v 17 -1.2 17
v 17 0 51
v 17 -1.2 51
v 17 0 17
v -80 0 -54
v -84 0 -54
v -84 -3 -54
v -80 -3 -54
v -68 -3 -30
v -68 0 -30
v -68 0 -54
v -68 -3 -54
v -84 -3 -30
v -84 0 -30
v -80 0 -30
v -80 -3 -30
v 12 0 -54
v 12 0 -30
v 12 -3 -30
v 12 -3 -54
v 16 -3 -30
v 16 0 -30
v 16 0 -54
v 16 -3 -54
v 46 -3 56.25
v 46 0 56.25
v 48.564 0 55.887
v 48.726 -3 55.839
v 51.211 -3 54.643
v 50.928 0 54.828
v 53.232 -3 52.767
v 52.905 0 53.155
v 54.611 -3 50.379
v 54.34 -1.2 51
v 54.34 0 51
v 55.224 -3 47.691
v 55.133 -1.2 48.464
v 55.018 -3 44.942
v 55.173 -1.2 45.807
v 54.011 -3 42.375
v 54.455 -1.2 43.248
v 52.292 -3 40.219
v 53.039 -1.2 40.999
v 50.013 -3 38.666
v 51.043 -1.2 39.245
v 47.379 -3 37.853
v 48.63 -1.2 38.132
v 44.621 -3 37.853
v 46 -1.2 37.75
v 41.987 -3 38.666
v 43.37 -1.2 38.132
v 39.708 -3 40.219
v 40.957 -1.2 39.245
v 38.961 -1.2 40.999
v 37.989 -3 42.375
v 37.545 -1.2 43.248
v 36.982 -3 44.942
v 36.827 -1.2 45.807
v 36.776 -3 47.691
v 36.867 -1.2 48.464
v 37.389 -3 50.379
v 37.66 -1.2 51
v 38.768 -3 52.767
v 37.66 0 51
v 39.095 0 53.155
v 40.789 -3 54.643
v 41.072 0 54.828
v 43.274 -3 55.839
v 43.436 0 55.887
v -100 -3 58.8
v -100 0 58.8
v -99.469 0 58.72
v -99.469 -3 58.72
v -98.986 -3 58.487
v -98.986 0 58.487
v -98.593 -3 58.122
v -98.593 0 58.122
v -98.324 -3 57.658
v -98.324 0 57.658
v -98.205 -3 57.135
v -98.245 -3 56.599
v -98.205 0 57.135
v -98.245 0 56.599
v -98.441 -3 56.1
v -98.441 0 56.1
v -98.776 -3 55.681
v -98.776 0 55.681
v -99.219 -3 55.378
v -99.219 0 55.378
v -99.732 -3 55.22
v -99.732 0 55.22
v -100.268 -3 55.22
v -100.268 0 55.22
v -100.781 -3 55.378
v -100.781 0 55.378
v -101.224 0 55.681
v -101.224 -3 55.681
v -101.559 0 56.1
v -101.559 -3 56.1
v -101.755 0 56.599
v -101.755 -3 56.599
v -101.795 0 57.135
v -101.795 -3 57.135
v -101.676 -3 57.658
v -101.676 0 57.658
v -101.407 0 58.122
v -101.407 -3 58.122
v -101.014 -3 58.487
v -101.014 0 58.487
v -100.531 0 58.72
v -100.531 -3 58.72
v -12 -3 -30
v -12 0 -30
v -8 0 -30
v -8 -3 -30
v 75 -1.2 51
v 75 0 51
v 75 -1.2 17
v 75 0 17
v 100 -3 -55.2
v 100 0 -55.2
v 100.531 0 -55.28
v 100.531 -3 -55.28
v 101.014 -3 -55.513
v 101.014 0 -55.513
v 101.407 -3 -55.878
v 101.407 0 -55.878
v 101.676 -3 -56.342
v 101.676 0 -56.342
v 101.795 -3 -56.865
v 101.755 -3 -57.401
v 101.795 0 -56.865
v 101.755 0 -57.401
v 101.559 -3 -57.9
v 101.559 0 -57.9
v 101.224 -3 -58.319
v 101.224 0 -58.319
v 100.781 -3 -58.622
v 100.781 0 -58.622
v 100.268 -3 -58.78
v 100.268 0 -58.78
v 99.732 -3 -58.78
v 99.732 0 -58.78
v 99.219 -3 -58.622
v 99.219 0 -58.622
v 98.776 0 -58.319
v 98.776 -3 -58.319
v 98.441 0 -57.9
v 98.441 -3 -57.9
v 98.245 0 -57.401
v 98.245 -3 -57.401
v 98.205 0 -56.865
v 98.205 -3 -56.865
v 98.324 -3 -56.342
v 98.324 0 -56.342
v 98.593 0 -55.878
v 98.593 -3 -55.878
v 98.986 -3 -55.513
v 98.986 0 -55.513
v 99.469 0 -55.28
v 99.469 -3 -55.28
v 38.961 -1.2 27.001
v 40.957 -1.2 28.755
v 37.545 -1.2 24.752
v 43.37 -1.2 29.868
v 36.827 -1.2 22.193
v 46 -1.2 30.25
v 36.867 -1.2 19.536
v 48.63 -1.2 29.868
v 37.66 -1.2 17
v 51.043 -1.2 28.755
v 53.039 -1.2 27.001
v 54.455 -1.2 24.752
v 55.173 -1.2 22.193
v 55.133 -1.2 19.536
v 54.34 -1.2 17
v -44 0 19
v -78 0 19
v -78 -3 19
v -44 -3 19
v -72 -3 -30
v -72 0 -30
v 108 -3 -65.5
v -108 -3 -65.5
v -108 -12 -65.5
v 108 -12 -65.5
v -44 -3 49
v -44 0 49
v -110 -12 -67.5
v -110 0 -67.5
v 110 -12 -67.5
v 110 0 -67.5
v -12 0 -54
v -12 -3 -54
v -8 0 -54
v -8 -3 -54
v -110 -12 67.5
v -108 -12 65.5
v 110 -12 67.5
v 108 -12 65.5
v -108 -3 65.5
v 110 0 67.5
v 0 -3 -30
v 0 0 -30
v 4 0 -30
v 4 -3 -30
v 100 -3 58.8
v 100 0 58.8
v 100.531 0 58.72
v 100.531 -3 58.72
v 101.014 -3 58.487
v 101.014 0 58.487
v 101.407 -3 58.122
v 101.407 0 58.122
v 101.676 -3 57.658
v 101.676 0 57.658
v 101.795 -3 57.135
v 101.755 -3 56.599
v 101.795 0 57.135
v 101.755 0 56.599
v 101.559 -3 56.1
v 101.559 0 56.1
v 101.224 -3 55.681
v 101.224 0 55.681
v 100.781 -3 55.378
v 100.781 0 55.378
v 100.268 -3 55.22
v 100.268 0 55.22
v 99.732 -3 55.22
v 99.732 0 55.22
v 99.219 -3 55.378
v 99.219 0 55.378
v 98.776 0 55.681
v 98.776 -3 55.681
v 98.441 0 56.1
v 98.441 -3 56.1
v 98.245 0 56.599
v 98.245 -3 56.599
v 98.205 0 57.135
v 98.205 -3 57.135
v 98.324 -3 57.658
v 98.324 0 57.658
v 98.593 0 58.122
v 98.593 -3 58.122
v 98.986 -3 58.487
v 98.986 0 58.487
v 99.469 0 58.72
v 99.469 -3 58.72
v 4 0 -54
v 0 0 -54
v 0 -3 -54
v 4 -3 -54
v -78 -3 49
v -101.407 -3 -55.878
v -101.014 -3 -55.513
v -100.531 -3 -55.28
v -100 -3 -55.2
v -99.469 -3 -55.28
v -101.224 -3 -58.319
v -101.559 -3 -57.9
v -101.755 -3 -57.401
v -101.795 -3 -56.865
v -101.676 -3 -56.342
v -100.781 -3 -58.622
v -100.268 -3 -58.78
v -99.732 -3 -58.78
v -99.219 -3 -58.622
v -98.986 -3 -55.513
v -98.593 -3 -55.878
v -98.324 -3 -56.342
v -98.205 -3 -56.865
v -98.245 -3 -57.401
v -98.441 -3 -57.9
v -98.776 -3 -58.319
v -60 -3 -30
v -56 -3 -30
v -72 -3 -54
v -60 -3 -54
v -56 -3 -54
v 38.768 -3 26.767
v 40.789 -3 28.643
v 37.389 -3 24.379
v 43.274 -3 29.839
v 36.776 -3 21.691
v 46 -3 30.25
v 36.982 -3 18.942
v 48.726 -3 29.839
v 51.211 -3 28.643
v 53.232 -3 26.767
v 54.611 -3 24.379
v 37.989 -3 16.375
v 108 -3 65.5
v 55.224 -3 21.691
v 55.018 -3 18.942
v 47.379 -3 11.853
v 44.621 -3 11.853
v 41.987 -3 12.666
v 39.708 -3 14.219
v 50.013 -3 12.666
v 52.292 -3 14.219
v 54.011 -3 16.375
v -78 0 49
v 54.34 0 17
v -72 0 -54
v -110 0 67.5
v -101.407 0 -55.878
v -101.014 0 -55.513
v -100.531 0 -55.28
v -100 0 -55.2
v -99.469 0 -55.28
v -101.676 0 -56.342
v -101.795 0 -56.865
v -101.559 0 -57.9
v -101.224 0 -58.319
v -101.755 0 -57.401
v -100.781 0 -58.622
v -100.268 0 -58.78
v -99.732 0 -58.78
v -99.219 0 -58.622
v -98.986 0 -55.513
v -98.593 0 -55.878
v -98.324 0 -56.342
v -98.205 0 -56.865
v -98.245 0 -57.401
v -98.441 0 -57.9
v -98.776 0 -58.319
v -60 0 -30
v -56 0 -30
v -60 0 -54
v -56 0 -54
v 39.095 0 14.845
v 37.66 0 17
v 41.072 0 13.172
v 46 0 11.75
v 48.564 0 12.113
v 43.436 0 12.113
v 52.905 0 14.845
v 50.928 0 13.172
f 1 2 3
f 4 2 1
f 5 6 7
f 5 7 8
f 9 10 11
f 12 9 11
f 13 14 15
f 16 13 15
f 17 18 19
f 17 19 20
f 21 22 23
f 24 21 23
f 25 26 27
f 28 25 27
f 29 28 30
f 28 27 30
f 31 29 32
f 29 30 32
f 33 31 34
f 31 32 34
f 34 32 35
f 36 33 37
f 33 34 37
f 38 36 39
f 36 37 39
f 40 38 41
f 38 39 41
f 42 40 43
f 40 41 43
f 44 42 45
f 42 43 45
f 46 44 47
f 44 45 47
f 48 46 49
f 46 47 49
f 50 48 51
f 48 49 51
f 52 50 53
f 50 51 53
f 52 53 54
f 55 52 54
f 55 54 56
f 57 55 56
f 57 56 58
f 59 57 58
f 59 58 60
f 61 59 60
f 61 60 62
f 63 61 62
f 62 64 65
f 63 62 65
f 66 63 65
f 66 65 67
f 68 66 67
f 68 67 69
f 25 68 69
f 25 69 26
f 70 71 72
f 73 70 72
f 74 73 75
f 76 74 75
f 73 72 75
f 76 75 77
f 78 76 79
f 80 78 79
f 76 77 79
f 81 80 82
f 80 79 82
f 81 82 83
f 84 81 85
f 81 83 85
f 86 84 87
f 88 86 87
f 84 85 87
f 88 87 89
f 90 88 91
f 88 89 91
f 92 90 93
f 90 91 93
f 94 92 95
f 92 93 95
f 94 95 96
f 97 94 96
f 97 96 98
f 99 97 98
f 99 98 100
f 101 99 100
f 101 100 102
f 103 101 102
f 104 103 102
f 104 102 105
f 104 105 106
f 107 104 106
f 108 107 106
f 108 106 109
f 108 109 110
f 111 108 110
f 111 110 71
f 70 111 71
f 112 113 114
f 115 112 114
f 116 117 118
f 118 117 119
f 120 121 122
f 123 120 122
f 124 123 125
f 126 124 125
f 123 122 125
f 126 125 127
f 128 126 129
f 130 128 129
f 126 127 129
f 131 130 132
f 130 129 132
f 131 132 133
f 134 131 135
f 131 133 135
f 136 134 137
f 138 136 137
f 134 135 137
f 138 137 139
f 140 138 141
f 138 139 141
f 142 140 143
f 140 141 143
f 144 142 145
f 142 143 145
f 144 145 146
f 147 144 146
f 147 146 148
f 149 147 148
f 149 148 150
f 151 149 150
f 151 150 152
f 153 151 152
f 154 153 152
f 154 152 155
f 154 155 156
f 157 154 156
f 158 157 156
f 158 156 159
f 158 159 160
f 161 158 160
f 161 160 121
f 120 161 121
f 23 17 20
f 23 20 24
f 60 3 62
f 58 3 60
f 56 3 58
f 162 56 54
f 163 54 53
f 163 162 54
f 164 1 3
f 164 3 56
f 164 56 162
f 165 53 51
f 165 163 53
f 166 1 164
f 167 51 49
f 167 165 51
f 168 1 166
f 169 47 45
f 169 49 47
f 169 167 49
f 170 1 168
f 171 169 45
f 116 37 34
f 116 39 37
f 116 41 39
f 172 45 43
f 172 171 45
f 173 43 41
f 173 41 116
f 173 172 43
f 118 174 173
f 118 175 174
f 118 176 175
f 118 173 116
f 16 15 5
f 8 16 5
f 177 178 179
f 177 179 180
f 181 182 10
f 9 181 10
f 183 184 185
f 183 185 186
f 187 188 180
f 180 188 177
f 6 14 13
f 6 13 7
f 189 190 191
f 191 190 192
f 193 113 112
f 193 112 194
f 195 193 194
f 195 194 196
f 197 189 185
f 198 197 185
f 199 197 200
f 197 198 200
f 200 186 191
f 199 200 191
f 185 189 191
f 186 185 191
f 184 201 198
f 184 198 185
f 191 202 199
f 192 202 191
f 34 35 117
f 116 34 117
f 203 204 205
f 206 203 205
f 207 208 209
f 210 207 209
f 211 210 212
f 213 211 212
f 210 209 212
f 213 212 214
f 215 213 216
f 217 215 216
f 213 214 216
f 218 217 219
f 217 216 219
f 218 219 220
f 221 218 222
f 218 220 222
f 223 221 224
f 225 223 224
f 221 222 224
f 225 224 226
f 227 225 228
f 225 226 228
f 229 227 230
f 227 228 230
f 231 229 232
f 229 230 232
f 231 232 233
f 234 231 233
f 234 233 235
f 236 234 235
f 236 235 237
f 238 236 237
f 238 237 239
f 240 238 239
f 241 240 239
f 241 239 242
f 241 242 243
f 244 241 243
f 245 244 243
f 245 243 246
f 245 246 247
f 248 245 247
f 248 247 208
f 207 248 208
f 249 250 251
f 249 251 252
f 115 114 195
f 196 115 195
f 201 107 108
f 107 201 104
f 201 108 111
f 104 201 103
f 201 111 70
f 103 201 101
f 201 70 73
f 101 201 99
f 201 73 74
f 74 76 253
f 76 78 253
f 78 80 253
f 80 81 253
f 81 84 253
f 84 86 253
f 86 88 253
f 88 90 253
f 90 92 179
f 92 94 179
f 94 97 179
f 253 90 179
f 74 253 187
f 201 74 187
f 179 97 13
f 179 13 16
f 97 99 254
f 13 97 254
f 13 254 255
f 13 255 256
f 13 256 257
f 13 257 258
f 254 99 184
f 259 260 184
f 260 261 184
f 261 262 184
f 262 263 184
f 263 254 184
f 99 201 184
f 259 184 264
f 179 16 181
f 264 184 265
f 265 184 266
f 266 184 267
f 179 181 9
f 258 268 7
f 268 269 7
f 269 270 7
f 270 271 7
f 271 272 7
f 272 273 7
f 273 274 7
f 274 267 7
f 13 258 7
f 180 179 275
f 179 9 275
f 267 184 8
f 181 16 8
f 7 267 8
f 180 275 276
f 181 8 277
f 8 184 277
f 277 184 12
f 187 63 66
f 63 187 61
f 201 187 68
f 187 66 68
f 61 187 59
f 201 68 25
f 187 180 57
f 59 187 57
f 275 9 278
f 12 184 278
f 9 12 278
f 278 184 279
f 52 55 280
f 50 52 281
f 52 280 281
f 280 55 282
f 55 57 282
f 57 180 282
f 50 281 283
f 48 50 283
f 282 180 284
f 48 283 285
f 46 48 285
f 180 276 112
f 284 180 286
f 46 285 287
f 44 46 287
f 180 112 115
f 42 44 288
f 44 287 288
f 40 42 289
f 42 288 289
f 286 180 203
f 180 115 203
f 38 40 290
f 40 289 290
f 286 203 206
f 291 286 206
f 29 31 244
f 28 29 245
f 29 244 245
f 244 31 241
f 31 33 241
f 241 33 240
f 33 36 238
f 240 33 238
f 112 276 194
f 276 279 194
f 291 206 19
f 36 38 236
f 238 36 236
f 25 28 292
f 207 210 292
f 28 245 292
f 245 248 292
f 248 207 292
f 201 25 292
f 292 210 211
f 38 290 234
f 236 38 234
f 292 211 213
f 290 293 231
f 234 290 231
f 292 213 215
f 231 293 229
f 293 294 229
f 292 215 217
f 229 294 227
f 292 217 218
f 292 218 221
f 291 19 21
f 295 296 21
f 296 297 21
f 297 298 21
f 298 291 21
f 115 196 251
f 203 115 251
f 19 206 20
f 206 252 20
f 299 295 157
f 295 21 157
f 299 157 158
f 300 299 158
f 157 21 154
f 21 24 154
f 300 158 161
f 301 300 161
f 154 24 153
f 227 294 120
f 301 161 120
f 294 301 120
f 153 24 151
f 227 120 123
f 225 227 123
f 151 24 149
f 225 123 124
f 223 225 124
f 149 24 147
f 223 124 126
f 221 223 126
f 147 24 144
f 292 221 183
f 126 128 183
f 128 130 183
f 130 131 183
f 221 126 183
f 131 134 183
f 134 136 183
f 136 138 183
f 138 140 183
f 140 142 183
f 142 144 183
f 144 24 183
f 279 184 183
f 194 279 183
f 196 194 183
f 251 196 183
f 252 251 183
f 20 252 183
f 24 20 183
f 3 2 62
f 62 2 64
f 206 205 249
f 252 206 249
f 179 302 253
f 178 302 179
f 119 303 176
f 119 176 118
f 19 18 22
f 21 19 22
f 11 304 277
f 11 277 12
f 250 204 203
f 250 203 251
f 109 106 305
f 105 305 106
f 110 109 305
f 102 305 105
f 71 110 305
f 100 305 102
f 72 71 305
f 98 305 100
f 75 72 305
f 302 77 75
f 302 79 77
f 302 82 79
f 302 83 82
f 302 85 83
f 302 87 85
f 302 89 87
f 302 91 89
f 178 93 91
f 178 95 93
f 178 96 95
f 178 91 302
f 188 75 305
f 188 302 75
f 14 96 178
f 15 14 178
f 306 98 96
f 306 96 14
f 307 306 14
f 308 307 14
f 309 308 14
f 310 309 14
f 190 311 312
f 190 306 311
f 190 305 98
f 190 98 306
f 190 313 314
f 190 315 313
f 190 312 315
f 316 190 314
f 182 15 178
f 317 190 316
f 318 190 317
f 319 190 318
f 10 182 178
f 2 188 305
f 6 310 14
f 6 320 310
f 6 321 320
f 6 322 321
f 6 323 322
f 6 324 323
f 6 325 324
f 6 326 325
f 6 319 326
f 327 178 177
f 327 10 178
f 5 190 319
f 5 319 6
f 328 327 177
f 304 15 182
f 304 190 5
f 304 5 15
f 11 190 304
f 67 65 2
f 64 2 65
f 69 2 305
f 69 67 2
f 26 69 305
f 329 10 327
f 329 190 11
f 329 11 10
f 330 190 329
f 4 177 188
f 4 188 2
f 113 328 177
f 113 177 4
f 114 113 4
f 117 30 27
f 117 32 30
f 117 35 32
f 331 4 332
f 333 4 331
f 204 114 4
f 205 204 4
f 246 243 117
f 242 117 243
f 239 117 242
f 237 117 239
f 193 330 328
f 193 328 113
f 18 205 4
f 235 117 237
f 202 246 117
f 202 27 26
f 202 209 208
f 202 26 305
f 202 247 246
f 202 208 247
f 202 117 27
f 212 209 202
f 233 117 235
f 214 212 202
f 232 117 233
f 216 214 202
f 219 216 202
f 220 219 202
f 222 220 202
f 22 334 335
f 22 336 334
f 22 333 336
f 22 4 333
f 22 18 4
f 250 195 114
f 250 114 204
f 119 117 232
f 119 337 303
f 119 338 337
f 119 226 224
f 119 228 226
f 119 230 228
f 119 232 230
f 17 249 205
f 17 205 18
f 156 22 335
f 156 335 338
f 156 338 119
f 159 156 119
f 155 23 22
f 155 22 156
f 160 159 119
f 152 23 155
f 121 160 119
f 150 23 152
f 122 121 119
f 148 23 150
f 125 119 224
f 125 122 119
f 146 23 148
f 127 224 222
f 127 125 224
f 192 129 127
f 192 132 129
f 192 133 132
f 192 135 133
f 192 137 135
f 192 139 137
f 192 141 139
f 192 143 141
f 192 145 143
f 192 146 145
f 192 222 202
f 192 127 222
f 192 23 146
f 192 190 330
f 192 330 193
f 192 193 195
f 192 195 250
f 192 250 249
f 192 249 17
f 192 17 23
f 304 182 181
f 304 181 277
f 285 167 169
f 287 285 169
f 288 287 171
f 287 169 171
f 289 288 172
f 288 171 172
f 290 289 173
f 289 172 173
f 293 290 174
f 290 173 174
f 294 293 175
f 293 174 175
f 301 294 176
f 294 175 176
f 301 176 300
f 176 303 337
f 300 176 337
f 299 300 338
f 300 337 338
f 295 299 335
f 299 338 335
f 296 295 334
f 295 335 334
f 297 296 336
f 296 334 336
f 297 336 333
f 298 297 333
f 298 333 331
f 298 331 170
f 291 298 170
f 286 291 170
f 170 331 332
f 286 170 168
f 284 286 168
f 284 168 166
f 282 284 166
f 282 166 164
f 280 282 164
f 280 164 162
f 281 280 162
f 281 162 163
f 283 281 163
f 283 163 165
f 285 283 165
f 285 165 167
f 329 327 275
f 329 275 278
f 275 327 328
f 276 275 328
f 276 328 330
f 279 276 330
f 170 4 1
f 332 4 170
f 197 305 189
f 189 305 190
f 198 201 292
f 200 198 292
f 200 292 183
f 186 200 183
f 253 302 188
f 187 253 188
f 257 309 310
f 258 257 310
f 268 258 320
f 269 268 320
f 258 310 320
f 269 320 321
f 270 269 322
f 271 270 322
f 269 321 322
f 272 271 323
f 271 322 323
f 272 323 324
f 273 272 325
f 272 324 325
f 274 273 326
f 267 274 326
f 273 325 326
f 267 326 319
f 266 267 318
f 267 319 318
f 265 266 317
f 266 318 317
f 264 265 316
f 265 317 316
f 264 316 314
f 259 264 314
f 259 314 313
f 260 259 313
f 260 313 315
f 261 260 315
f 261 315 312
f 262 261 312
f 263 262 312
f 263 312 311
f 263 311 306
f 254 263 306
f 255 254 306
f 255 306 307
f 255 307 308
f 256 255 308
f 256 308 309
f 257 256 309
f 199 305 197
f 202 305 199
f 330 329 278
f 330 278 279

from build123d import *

# Parameters (mm, degrees)
SKETCH_1_W                       = 220
SKETCH_1_H                       = 135
LID_TOP_3MM_DEPTH                = 3
SKETCH_2_W                       = 216
SKETCH_2_H                       = 2
LID_RIM_BACK_DEPTH               = 12
SKETCH_3_W                       = 216
SKETCH_3_H                       = 2
LID_RIM_FRONT_DEPTH              = 12
SKETCH_4_W                       = 2
SKETCH_4_H                       = 135
LID_RIM_LEFT_DEPTH               = 12
SKETCH_5_W                       = 2
SKETCH_5_H                       = 135
LID_RIM_RIGHT_DEPTH              = 12
SKETCH_6_R                       = 1.8
LID_SCREW_CLEARANCE_1_DEPTH      = 16
SKETCH_7_R                       = 1.8
LID_SCREW_CLEARANCE_2_DEPTH      = 16
SKETCH_8_R                       = 1.8
LID_SCREW_CLEARANCE_3_DEPTH      = 16
SKETCH_9_R                       = 1.8
LID_SCREW_CLEARANCE_4_DEPTH      = 16
SKETCH_10_R                      = 9
OV5647_LENS_OPENING_D18_DEPTH    = 4
SKETCH_11_W                      = 34
SKETCH_11_H                      = 30
OV5647_SERVICE_CLEARANCE_DEPTH   = 4
SKETCH_12_R                      = 9.25
HC_SR04_ACOUSTIC_OPENING_1_DEPTH = 4
SKETCH_13_R                      = 9.25
HC_SR04_ACOUSTIC_OPENING_2_DEPTH = 4
SKETCH_14_W                      = 58
SKETCH_14_H                      = 34
HC_SR04_RECESS_DEPTH             = 1.2
SKETCH_15_W                      = 4
SKETCH_15_H                      = 24
VENT_SLOT_1_DEPTH                = 4
SKETCH_16_W                      = 4
SKETCH_16_H                      = 24
VENT_SLOT_2_DEPTH                = 4
SKETCH_17_W                      = 4
SKETCH_17_H                      = 24
VENT_SLOT_3_DEPTH                = 4
SKETCH_18_W                      = 4
SKETCH_18_H                      = 24
VENT_SLOT_4_DEPTH                = 4
SKETCH_19_W                      = 4
SKETCH_19_H                      = 24
VENT_SLOT_5_DEPTH                = 4
SKETCH_20_W                      = 4
SKETCH_20_H                      = 24
VENT_SLOT_6_DEPTH                = 4


with BuildPart() as part:
    # 草图1 → Lid_Top_3mm (new body)
    with BuildSketch(Plane(origin=(0, 0, 0), x_dir=(1, 0, 0), z_dir=(0, 1, 0))):
        Rectangle(SKETCH_1_W, SKETCH_1_H)
    extrude(amount=-LID_TOP_3MM_DEPTH)

    # 草图2 → Lid_Rim_Back (add)
    with BuildSketch(Plane(origin=(0, 0, 0), x_dir=(1, 0, 0), z_dir=(0, 1, 0))):
        with Locations((0, 66.5)):
            Rectangle(SKETCH_2_W, SKETCH_2_H)
    extrude(amount=-LID_RIM_BACK_DEPTH)

    # 草图3 → Lid_Rim_Front (add)
    with BuildSketch(Plane(origin=(0, 0, 0), x_dir=(1, 0, 0), z_dir=(0, 1, 0))):
        with Locations((0, -66.5)):
            Rectangle(SKETCH_3_W, SKETCH_3_H)
    extrude(amount=-LID_RIM_FRONT_DEPTH)

    # 草图4 → Lid_Rim_Left (add)
    with BuildSketch(Plane(origin=(0, 0, 0), x_dir=(1, 0, 0), z_dir=(0, 1, 0))):
        with Locations((-109, 0)):
            Rectangle(SKETCH_4_W, SKETCH_4_H)
    extrude(amount=-LID_RIM_LEFT_DEPTH)

    # 草图5 → Lid_Rim_Right (add)
    with BuildSketch(Plane(origin=(0, 0, 0), x_dir=(1, 0, 0), z_dir=(0, 1, 0))):
        with Locations((109, 0)):
            Rectangle(SKETCH_5_W, SKETCH_5_H)
    extrude(amount=-LID_RIM_RIGHT_DEPTH)

    # 草图6 → Lid_Screw_Clearance_1 (cut)
    with BuildSketch(Plane(origin=(0, 0, 0), x_dir=(1, 0, 0), z_dir=(0, 1, 0))):
        with Locations(Location((-100, -57, 0), (0, 0, 270))):
            Circle(SKETCH_6_R)
    extrude(amount=-LID_SCREW_CLEARANCE_1_DEPTH, mode=Mode.SUBTRACT)

    # 草图7 → Lid_Screw_Clearance_2 (cut)
    with BuildSketch(Plane(origin=(0, 0, 0), x_dir=(1, 0, 0), z_dir=(0, 1, 0))):
        with Locations(Location((100, -57, 0), (0, 0, 270))):
            Circle(SKETCH_7_R)
    extrude(amount=-LID_SCREW_CLEARANCE_2_DEPTH, mode=Mode.SUBTRACT)

    # 草图8 → Lid_Screw_Clearance_3 (cut)
    with BuildSketch(Plane(origin=(0, 0, 0), x_dir=(1, 0, 0), z_dir=(0, 1, 0))):
        with Locations(Location((-100, 57, 0), (0, 0, 270))):
            Circle(SKETCH_8_R)
    extrude(amount=-LID_SCREW_CLEARANCE_3_DEPTH, mode=Mode.SUBTRACT)

    # 草图9 → Lid_Screw_Clearance_4 (cut)
    with BuildSketch(Plane(origin=(0, 0, 0), x_dir=(1, 0, 0), z_dir=(0, 1, 0))):
        with Locations(Location((100, 57, 0), (0, 0, 270))):
            Circle(SKETCH_9_R)
    extrude(amount=-LID_SCREW_CLEARANCE_4_DEPTH, mode=Mode.SUBTRACT)

    # 草图10 → OV5647_Lens_Opening_D18 (cut)
    with BuildSketch(Plane(origin=(0, 0, 0), x_dir=(1, 0, 0), z_dir=(0, 1, 0))):
        with Locations(Location((-61, -34, 0), (0, 0, 270))):
            Circle(SKETCH_10_R)
    extrude(amount=-OV5647_LENS_OPENING_D18_DEPTH, mode=Mode.SUBTRACT)

    # 草图11 → OV5647_Service_Clearance (cut)
    with BuildSketch(Plane(origin=(0, 0, 0), x_dir=(1, 0, 0), z_dir=(0, 1, 0))):
        with Locations((-61, -34)):
            Rectangle(SKETCH_11_W, SKETCH_11_H)
    extrude(amount=-OV5647_SERVICE_CLEARANCE_DEPTH, mode=Mode.SUBTRACT)

    # 草图12 → HC_SR04_Acoustic_Opening_1 (cut)
    with BuildSketch(Plane(origin=(0, 0, 0), x_dir=(1, 0, 0), z_dir=(0, 1, 0))):
        with Locations(Location((46, -47, 0), (0, 0, 270))):
            Circle(SKETCH_12_R)
    extrude(amount=-HC_SR04_ACOUSTIC_OPENING_1_DEPTH, mode=Mode.SUBTRACT)

    # 草图13 → HC_SR04_Acoustic_Opening_2 (cut)
    with BuildSketch(Plane(origin=(0, 0, 0), x_dir=(1, 0, 0), z_dir=(0, 1, 0))):
        with Locations(Location((46, -21, 0), (0, 0, 270))):
            Circle(SKETCH_13_R)
    extrude(amount=-HC_SR04_ACOUSTIC_OPENING_2_DEPTH, mode=Mode.SUBTRACT)

    # 草图14 → HC_SR04_Recess (cut)
    with BuildSketch(Plane(origin=(0, 0, 0), x_dir=(1, 0, 0), z_dir=(0, 1, 0))):
        with Locations((46, -34)):
            Rectangle(SKETCH_14_W, SKETCH_14_H)
    extrude(amount=-HC_SR04_RECESS_DEPTH, mode=Mode.SUBTRACT)

    # 草图15 → Vent_Slot_1 (cut)
    with BuildSketch(Plane(origin=(0, 0, 0), x_dir=(1, 0, 0), z_dir=(0, 1, 0))):
        with Locations((-82, 42)):
            Rectangle(SKETCH_15_W, SKETCH_15_H)
    extrude(amount=-VENT_SLOT_1_DEPTH, mode=Mode.SUBTRACT)

    # 草图16 → Vent_Slot_2 (cut)
    with BuildSketch(Plane(origin=(0, 0, 0), x_dir=(1, 0, 0), z_dir=(0, 1, 0))):
        with Locations((-70, 42)):
            Rectangle(SKETCH_16_W, SKETCH_16_H)
    extrude(amount=-VENT_SLOT_2_DEPTH, mode=Mode.SUBTRACT)

    # 草图17 → Vent_Slot_3 (cut)
    with BuildSketch(Plane(origin=(0, 0, 0), x_dir=(1, 0, 0), z_dir=(0, 1, 0))):
        with Locations((-58, 42)):
            Rectangle(SKETCH_17_W, SKETCH_17_H)
    extrude(amount=-VENT_SLOT_3_DEPTH, mode=Mode.SUBTRACT)

    # 草图18 → Vent_Slot_4 (cut)
    with BuildSketch(Plane(origin=(0, 0, 0), x_dir=(1, 0, 0), z_dir=(0, 1, 0))):
        with Locations((-10, 42)):
            Rectangle(SKETCH_18_W, SKETCH_18_H)
    extrude(amount=-VENT_SLOT_4_DEPTH, mode=Mode.SUBTRACT)

    # 草图19 → Vent_Slot_5 (cut)
    with BuildSketch(Plane(origin=(0, 0, 0), x_dir=(1, 0, 0), z_dir=(0, 1, 0))):
        with Locations((2, 42)):
            Rectangle(SKETCH_19_W, SKETCH_19_H)
    extrude(amount=-VENT_SLOT_5_DEPTH, mode=Mode.SUBTRACT)

    # 草图20 → Vent_Slot_6 (cut)
    with BuildSketch(Plane(origin=(0, 0, 0), x_dir=(1, 0, 0), z_dir=(0, 1, 0))):
        with Locations((14, 42)):
            Rectangle(SKETCH_20_W, SKETCH_20_H)
    extrude(amount=-VENT_SLOT_6_DEPTH, mode=Mode.SUBTRACT)


solid = part.part
